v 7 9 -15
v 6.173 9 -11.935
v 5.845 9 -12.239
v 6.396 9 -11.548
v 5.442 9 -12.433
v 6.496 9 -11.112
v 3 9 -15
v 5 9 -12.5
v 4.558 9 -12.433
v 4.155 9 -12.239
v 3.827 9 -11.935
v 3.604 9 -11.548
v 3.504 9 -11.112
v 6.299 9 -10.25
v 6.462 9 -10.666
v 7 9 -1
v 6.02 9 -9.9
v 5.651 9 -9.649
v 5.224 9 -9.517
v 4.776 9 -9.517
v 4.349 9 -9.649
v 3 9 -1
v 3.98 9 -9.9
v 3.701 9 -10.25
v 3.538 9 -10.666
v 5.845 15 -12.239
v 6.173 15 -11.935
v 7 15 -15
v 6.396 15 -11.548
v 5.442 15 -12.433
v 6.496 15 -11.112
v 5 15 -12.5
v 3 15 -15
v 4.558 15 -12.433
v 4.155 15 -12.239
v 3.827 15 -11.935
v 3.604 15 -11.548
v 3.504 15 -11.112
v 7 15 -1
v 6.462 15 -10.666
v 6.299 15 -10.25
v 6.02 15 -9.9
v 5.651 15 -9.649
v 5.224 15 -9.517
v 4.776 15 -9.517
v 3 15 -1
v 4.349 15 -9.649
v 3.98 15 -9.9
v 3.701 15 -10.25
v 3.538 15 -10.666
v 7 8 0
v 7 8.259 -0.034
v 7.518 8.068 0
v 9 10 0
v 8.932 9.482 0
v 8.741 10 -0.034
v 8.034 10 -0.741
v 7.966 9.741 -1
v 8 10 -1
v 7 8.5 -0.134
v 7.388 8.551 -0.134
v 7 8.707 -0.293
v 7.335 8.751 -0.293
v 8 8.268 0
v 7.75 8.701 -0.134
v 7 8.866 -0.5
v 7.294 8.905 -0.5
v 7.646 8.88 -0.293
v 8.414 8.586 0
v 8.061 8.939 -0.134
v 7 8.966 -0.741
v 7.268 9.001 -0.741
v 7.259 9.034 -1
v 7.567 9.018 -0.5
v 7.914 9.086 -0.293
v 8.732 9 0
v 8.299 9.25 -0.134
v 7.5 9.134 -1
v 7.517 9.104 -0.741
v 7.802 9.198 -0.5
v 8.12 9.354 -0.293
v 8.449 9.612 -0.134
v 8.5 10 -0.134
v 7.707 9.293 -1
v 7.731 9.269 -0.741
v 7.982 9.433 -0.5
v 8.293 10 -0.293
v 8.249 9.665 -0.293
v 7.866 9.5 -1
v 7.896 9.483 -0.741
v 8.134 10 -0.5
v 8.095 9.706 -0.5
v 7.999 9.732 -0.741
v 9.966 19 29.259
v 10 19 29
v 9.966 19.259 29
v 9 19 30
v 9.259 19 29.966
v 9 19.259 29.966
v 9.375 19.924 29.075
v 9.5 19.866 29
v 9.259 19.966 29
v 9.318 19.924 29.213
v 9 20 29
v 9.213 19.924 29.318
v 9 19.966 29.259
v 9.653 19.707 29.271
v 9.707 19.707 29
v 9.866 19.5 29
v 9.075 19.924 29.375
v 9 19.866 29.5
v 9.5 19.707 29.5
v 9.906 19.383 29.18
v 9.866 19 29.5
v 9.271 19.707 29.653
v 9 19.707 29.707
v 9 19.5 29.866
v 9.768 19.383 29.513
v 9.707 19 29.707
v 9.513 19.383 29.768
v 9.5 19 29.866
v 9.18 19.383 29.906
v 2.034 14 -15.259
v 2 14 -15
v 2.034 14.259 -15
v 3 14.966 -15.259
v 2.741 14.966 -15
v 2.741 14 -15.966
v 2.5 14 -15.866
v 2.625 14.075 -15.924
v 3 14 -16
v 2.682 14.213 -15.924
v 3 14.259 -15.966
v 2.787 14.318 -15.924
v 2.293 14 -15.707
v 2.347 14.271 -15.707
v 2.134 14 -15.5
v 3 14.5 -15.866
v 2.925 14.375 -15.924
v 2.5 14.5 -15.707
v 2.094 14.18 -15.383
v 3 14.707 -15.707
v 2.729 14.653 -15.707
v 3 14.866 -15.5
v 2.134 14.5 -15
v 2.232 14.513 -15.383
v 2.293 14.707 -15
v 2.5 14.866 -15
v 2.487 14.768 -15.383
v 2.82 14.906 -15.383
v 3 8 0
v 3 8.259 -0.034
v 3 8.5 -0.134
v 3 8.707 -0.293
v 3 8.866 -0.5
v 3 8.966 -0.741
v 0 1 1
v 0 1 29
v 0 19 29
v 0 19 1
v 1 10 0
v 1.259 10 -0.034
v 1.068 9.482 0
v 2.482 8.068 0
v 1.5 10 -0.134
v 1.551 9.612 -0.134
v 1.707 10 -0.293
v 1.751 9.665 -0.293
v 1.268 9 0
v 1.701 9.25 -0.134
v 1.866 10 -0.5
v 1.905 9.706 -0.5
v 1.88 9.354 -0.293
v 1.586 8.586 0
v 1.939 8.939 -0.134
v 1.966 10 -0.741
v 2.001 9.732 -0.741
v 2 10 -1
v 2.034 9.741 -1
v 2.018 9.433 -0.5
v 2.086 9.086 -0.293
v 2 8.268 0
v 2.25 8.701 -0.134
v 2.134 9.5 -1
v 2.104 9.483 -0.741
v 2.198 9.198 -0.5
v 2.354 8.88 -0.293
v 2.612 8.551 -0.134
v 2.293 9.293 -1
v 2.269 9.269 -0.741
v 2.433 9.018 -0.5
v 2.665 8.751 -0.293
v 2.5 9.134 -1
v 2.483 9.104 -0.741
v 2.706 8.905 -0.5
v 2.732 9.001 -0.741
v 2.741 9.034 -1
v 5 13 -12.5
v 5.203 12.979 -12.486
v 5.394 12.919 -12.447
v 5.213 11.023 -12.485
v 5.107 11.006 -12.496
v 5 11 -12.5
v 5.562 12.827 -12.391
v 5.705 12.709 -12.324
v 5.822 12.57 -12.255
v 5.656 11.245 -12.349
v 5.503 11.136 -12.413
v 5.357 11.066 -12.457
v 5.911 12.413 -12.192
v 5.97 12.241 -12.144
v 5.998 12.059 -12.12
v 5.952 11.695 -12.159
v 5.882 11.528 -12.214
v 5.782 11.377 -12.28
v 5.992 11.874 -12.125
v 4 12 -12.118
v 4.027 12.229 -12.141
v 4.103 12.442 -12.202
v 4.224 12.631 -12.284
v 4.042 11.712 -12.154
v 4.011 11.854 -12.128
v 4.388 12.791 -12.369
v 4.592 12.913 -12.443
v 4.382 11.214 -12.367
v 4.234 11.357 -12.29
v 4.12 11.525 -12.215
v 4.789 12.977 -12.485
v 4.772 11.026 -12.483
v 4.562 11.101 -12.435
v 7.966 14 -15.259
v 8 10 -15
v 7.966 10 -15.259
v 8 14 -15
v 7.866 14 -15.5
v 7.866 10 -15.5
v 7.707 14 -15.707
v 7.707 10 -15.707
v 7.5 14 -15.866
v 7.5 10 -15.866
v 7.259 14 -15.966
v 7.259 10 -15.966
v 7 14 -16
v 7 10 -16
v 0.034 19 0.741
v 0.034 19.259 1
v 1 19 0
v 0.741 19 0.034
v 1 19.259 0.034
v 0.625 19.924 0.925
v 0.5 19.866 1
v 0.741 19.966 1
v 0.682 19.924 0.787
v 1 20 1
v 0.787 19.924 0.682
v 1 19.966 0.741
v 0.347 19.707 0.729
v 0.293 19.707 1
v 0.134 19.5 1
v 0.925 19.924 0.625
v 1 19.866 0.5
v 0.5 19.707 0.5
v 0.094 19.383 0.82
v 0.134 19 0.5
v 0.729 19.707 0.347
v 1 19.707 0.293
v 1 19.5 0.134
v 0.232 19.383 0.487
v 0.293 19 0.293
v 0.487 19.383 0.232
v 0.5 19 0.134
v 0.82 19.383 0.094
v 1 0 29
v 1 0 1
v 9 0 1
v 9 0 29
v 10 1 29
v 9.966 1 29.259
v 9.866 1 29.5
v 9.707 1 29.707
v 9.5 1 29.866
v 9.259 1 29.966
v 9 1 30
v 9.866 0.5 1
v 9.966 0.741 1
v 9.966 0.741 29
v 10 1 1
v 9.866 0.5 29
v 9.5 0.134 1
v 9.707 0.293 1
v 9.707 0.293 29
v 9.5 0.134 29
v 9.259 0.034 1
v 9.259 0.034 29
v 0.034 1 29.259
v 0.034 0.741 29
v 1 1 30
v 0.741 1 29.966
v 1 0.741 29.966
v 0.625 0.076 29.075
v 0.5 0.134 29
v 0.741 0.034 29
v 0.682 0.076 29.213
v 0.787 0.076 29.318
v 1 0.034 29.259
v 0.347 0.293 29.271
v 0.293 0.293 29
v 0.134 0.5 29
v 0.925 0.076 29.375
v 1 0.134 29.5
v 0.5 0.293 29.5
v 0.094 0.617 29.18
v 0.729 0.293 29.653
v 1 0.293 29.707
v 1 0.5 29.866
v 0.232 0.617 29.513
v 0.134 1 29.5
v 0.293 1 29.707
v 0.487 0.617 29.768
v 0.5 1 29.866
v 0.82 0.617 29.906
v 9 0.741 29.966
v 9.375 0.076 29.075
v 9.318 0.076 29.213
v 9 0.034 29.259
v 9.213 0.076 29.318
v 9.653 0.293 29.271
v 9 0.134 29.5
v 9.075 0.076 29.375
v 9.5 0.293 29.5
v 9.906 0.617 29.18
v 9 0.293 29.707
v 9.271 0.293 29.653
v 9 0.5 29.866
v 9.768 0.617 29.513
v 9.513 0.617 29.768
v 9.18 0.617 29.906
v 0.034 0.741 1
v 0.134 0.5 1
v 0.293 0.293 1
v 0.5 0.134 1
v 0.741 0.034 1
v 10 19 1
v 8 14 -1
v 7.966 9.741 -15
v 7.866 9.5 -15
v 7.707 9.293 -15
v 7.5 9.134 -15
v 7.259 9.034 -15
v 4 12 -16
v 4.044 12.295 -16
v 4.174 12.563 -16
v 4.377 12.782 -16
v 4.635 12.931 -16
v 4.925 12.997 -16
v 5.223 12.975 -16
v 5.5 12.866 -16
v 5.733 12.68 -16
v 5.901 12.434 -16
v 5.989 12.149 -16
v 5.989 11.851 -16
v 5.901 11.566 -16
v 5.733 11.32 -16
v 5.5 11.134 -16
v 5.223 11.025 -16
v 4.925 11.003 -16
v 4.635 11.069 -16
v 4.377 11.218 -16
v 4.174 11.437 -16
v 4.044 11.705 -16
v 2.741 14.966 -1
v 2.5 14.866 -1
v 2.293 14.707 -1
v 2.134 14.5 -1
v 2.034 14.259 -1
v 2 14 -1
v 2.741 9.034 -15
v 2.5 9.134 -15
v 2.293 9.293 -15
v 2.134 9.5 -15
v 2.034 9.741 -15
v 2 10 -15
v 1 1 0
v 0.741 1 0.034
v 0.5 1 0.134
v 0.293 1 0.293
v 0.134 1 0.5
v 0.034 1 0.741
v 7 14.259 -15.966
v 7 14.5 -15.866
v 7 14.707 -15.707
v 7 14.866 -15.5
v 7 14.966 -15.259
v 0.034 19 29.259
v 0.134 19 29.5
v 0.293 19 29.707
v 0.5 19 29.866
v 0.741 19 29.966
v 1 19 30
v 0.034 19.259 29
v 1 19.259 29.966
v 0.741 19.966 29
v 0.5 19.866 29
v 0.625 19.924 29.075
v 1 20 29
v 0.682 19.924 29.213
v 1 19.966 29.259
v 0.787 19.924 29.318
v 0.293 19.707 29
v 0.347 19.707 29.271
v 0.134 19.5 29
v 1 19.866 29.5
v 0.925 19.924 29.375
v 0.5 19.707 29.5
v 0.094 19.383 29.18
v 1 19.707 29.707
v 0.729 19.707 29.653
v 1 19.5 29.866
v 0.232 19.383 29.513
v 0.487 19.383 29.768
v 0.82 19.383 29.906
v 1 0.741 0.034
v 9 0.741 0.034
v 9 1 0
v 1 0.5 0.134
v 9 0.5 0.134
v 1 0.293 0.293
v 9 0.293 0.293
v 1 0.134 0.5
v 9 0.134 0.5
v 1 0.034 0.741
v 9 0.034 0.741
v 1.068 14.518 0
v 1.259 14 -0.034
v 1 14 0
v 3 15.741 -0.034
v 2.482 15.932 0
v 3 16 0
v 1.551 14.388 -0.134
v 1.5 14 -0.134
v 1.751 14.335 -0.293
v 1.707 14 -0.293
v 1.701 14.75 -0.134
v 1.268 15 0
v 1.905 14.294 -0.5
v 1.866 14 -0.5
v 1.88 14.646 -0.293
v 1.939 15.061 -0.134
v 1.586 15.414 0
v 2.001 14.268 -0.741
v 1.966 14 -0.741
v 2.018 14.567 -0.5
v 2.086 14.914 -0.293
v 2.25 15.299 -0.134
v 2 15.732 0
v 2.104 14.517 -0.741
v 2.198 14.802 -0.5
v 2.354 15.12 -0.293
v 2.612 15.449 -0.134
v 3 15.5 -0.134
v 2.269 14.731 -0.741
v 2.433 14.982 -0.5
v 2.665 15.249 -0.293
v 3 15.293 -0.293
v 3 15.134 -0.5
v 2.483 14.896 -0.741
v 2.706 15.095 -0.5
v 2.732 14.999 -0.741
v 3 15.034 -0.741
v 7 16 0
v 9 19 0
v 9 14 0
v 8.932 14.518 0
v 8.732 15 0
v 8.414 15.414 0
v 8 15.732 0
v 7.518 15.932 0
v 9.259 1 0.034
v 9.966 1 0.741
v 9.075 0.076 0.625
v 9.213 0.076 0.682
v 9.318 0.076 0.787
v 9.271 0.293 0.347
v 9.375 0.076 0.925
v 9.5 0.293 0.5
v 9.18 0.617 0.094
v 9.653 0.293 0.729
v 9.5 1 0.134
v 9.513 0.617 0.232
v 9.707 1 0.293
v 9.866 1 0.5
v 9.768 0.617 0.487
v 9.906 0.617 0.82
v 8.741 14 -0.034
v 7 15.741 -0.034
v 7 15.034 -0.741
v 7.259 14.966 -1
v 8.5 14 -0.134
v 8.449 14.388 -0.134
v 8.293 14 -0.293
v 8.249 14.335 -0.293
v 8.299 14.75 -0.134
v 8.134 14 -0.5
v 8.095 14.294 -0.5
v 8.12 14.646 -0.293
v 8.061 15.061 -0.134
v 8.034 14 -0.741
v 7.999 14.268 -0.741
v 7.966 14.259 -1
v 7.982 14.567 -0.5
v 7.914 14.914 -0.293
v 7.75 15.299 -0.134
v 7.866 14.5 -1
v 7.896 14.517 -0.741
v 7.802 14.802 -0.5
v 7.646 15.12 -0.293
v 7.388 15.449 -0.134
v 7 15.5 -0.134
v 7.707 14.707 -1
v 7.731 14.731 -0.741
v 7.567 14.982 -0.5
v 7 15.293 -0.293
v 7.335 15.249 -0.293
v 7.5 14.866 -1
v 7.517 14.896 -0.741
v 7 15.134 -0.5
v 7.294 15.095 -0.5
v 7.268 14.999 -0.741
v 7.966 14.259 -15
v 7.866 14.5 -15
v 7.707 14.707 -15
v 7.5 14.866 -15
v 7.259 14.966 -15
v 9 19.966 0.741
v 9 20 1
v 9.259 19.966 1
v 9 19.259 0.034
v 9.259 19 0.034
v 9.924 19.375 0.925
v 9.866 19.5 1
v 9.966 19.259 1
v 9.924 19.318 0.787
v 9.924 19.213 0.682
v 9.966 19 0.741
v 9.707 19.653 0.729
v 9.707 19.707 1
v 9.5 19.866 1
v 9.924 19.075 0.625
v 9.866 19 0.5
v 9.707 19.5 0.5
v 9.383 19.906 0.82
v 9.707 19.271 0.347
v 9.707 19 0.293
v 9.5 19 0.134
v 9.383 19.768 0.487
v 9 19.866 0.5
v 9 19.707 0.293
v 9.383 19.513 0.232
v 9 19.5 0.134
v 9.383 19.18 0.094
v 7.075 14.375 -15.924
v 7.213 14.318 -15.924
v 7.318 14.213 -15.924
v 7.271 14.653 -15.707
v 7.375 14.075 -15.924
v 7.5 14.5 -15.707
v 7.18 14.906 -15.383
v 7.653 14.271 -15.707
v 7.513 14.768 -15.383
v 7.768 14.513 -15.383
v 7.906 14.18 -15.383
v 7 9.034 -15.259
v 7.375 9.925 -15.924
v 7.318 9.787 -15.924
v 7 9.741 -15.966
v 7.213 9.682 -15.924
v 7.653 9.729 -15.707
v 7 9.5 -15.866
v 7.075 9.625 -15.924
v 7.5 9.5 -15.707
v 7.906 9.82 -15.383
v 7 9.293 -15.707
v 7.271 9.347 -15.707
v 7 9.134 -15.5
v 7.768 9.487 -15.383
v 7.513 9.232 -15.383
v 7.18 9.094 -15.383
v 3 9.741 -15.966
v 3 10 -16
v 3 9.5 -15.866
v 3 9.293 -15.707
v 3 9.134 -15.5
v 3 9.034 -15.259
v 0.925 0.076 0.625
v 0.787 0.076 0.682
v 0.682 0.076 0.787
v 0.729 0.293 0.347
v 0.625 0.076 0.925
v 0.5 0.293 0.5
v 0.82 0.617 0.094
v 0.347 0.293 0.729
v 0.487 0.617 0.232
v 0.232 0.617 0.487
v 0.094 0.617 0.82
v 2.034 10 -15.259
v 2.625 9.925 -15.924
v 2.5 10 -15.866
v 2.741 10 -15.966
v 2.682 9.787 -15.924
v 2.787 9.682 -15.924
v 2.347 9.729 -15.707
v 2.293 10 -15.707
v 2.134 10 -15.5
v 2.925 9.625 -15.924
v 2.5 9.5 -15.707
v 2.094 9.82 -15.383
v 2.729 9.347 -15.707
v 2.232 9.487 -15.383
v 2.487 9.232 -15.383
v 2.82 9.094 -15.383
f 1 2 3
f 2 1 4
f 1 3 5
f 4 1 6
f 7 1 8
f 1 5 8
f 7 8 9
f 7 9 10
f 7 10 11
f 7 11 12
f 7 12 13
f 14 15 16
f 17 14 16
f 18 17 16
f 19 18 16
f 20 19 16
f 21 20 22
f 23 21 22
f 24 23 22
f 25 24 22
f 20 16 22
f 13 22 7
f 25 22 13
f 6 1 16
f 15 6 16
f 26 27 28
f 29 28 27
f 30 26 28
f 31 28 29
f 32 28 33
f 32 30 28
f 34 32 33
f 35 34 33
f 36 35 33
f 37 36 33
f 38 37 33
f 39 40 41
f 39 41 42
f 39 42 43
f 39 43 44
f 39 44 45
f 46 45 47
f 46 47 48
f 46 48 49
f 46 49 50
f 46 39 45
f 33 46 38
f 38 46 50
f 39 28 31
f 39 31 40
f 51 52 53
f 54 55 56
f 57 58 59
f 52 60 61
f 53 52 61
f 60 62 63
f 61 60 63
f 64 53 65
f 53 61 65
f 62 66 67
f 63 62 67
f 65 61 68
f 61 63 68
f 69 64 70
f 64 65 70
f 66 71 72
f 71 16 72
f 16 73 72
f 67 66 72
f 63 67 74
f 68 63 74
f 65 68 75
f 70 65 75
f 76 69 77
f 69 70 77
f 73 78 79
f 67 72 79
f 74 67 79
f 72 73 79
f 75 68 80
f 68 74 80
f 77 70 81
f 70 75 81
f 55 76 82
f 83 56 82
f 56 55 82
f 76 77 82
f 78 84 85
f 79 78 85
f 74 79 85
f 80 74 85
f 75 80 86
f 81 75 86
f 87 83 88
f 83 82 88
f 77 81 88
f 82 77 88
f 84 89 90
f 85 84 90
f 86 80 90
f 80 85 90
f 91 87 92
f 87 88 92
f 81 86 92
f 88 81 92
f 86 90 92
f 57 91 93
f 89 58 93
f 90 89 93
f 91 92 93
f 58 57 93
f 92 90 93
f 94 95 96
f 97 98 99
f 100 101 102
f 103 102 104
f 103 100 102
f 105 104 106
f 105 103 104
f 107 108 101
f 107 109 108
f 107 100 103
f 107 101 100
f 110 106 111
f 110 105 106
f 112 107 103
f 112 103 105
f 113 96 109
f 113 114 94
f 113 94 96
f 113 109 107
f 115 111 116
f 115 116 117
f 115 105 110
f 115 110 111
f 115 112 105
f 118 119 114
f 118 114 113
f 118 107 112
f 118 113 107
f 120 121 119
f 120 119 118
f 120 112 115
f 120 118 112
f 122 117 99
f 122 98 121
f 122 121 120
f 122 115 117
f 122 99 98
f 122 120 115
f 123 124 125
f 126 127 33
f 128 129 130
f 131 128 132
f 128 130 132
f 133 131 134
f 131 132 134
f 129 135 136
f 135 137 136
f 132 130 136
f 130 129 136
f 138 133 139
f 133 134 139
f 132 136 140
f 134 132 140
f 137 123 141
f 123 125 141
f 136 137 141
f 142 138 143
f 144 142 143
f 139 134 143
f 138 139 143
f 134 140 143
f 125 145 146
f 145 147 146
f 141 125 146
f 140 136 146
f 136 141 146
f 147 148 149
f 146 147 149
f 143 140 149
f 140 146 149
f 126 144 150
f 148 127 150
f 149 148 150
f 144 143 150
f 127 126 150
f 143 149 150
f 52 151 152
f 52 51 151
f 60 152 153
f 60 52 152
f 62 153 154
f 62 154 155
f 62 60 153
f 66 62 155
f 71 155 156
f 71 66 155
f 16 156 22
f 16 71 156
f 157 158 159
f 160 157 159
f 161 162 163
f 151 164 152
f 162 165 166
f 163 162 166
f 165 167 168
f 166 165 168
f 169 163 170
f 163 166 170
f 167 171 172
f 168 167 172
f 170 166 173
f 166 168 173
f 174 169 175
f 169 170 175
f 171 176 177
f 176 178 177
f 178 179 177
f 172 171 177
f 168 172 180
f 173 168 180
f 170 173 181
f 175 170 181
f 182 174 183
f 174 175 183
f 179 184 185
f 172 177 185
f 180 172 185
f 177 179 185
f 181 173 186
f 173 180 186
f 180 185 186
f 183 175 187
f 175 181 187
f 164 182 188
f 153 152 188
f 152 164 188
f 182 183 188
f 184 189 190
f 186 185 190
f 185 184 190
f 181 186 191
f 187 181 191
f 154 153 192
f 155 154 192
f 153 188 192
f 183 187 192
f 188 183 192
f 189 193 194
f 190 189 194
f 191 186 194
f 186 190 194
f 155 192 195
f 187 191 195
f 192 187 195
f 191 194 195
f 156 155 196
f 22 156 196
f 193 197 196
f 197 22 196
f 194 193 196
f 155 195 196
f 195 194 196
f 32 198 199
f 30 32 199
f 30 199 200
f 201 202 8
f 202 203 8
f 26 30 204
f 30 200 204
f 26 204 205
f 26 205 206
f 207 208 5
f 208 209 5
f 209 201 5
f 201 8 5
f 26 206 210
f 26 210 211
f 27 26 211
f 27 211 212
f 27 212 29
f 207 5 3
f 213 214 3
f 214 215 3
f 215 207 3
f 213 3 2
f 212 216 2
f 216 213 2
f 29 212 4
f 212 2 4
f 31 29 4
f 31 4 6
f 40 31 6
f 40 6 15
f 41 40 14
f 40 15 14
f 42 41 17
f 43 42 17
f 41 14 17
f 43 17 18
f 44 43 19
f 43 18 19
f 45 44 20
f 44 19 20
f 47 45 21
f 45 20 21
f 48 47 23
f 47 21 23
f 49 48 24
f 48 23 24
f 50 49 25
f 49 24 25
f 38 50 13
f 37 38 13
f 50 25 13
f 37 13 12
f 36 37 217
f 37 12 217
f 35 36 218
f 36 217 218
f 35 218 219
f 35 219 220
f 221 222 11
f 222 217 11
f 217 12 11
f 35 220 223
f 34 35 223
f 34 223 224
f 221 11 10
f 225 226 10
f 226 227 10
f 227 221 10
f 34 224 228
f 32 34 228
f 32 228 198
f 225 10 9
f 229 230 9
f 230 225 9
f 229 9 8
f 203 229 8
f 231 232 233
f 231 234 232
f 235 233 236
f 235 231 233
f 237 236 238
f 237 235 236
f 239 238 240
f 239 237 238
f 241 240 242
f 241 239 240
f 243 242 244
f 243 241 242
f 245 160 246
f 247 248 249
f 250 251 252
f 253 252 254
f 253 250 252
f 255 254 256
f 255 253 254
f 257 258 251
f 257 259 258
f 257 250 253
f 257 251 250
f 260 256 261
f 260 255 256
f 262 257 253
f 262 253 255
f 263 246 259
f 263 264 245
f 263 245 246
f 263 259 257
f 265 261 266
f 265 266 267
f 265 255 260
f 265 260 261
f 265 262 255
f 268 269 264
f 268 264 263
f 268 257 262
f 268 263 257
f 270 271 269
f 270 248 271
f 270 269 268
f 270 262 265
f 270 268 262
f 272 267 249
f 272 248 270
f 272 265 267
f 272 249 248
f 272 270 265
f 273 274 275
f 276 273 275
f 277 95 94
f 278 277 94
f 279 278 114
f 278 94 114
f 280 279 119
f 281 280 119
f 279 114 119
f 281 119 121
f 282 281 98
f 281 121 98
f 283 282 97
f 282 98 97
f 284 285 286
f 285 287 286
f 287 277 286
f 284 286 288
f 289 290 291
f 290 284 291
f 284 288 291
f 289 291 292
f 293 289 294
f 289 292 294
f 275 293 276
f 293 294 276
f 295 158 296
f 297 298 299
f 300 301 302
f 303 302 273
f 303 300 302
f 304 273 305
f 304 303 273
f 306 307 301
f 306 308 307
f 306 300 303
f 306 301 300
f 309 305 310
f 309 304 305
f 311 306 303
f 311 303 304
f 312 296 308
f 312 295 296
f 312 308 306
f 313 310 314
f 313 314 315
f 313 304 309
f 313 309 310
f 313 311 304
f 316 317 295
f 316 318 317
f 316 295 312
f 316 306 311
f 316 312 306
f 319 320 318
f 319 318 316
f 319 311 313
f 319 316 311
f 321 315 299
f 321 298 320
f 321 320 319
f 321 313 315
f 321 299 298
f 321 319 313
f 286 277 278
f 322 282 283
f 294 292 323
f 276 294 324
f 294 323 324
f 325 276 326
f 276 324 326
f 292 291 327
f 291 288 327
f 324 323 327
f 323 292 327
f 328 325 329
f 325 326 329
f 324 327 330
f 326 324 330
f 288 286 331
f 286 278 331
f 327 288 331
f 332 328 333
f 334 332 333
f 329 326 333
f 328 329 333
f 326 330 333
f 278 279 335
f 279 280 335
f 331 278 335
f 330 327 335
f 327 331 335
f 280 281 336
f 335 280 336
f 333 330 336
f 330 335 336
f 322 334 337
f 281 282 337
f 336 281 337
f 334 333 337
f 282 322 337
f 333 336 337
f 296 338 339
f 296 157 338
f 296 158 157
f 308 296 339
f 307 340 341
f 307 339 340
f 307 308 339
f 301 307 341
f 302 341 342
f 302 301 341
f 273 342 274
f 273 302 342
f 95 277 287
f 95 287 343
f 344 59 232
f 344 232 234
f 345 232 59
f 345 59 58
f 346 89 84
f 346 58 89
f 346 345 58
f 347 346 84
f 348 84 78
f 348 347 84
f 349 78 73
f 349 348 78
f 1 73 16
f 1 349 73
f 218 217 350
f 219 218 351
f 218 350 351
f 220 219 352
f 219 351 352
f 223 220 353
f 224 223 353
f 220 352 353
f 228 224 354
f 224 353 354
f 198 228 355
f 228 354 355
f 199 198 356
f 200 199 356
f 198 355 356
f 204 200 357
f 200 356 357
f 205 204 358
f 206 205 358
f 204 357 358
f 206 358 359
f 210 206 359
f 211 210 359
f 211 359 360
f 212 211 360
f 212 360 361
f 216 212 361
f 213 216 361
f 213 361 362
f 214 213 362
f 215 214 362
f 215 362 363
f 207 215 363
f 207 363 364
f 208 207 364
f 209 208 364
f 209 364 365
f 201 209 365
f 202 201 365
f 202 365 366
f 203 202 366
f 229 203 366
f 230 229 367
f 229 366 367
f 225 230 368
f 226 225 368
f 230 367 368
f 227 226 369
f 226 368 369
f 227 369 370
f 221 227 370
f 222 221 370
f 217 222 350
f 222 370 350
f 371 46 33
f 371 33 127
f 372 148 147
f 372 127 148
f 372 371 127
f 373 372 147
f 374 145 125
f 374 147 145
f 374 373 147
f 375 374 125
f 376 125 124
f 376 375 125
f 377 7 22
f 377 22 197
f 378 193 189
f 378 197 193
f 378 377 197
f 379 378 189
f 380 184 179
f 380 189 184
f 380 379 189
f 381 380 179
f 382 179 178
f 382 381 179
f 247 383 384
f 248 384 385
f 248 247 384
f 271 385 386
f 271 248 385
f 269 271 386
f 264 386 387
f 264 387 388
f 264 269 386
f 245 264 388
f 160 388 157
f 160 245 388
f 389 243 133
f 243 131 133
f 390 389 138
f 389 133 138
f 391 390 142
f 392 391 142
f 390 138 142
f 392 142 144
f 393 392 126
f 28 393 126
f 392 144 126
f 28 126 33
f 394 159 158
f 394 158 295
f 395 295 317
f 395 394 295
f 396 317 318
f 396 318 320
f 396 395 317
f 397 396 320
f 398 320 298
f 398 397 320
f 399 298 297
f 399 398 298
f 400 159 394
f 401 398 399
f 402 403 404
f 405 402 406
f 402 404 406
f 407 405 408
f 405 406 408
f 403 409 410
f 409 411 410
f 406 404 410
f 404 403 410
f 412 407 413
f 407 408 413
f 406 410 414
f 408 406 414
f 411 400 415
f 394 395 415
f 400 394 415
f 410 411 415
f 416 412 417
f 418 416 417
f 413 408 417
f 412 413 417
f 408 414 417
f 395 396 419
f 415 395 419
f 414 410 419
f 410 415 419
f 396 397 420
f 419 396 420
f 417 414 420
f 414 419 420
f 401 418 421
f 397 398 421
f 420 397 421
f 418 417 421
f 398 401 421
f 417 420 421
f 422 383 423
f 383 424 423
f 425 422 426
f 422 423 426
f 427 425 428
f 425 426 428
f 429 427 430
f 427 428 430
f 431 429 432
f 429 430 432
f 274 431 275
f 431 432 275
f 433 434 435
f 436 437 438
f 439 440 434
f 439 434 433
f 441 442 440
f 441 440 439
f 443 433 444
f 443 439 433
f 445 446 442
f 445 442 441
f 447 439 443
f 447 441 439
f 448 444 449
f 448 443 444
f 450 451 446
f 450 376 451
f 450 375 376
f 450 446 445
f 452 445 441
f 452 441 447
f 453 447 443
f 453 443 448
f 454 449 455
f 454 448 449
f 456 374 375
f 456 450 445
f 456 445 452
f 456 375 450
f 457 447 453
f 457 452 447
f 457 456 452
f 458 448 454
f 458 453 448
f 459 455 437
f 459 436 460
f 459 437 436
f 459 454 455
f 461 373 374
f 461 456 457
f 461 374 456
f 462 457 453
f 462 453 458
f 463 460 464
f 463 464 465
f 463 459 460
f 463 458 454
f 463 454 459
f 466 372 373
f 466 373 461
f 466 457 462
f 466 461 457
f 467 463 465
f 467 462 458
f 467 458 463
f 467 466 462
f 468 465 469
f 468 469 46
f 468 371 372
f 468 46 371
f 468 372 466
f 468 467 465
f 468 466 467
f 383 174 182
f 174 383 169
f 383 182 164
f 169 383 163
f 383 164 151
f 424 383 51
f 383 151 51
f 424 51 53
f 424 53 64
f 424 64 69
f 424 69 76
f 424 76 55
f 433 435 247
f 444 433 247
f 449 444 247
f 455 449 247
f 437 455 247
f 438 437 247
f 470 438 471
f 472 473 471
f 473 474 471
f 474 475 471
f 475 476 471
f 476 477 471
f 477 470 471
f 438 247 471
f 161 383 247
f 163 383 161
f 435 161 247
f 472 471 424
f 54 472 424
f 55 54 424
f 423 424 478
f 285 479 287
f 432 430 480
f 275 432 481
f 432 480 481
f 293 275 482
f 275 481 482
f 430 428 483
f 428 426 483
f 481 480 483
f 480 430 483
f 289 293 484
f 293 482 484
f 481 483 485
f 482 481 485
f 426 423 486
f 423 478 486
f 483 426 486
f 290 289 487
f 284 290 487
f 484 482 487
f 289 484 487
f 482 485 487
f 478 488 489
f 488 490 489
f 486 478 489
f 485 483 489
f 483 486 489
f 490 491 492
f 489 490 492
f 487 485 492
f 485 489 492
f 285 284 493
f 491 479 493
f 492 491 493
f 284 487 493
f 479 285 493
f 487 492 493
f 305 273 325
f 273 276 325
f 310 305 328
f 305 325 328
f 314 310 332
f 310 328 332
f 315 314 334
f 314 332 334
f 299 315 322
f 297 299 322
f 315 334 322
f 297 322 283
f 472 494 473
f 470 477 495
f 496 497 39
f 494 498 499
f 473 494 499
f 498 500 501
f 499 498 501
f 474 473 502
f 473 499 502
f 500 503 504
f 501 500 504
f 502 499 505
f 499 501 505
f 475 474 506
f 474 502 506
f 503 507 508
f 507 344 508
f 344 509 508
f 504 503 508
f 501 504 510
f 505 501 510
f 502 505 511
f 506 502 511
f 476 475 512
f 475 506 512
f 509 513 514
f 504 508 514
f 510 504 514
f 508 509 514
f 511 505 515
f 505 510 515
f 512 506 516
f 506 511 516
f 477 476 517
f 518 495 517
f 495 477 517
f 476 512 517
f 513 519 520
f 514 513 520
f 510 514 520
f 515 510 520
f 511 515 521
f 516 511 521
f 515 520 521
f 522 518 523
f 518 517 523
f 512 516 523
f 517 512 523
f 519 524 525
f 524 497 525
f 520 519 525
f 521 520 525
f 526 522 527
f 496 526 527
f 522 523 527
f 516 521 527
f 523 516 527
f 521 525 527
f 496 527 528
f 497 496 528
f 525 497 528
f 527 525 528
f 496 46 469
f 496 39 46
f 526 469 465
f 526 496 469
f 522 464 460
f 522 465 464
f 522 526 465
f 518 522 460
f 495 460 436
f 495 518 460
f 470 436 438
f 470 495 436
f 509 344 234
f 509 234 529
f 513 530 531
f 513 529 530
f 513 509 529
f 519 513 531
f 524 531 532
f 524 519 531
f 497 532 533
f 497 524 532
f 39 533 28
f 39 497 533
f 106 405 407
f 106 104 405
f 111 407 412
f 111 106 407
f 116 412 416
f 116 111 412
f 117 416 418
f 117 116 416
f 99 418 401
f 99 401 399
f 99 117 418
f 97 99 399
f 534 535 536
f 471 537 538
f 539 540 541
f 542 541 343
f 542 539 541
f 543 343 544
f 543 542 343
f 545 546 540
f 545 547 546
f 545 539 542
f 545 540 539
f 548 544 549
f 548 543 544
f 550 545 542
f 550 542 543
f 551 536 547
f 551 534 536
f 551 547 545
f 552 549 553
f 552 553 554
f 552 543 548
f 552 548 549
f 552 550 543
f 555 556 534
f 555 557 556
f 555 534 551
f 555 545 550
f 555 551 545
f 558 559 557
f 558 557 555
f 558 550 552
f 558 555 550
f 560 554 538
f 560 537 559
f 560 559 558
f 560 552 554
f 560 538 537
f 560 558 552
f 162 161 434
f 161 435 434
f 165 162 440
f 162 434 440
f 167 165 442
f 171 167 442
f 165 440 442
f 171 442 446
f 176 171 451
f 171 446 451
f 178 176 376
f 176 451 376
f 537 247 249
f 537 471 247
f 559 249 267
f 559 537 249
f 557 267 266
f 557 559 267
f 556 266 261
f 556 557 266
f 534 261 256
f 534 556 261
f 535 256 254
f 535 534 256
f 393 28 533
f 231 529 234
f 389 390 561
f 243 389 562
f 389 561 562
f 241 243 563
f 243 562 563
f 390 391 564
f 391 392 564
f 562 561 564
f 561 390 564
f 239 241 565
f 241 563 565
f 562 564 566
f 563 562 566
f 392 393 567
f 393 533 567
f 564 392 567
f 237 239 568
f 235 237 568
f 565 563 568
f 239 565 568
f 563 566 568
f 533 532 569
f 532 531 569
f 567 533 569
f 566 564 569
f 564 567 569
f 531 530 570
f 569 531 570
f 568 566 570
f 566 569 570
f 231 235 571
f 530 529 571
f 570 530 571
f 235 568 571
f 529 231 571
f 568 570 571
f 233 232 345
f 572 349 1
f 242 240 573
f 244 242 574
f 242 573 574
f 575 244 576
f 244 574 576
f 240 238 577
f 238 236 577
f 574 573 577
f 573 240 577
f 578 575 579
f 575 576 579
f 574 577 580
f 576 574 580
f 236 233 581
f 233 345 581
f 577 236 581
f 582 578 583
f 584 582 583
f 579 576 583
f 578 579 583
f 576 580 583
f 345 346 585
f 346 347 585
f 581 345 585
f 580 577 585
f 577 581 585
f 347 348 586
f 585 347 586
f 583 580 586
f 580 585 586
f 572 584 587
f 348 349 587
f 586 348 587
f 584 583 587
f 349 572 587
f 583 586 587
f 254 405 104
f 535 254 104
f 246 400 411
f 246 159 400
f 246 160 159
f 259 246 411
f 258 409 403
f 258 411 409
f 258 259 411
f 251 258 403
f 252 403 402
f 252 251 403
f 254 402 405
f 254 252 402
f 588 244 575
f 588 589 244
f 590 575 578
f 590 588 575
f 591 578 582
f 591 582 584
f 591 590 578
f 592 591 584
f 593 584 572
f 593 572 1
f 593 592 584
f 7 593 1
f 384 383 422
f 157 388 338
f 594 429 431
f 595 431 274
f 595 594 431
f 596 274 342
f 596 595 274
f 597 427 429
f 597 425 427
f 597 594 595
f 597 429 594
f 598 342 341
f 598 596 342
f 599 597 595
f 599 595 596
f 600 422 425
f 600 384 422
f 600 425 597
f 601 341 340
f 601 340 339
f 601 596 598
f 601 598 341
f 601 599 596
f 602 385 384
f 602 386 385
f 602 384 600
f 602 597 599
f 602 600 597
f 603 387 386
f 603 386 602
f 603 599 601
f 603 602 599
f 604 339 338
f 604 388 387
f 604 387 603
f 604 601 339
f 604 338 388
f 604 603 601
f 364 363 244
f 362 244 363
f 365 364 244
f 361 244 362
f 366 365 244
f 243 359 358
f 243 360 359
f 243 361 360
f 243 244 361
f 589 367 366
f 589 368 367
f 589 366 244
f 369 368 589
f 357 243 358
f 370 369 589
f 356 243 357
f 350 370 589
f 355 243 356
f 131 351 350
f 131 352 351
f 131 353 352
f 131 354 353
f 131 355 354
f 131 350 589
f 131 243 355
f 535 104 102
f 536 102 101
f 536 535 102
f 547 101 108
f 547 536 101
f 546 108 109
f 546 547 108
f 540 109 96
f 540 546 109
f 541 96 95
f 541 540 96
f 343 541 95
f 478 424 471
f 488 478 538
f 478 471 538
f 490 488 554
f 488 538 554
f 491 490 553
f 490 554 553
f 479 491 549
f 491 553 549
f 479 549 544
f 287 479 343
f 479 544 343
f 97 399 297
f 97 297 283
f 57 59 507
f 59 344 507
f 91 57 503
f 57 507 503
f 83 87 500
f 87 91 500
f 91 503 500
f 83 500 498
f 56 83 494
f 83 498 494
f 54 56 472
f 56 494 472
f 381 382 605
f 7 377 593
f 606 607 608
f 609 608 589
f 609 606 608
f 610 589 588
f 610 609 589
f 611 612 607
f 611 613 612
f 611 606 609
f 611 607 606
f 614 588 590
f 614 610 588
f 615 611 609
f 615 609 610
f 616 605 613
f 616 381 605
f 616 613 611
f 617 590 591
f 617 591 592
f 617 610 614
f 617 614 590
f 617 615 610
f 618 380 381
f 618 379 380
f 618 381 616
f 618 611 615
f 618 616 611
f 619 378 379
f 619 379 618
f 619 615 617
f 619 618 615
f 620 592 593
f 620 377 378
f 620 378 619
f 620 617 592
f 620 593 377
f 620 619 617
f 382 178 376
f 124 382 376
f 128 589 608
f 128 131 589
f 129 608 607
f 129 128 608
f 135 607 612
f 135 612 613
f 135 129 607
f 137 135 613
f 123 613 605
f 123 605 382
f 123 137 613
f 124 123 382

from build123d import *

# Parameters (mm, degrees)
SKETCH_1_W          = 10
SKETCH_1_H          = 22
EXTRUDE_1_DEPTH     = 30
SKETCH_2_W          = 6
SKETCH_2_H          = 6
EXTRUDE_3_DEPTH     = 14
SKETCH_3_R          = 1.5
CUT_EXTRUDE_1_DEPTH = 6
SKETCH_6_W          = 10
SKETCH_6_H          = 30
CUT_EXTRUDE_2_DEPTH = 2
SKETCH_7_W          = 6
SKETCH_7_H          = 6
EXTRUDE_4_DEPTH     = 2
SKETCH_8_R          = 1
CUT_EXTRUDE_3_DEPTH = 4
FILLET_1_R          = 1


with BuildPart() as part:
    # 草图1 → 凸台-拉伸1 (new body)
    with BuildSketch(Plane.XY):
        with Locations((5, 11)):
            Rectangle(SKETCH_1_W, SKETCH_1_H)
    extrude(amount=EXTRUDE_1_DEPTH)

    # 草图2 → 凸台-拉伸3 (add)
    with BuildSketch(Plane.XY):
        with Locations((5, 12)):
            Rectangle(SKETCH_2_W, SKETCH_2_H)
    extrude(amount=-EXTRUDE_3_DEPTH)

    # 草图3 → 切除-拉伸1 (cut)
    with BuildSketch(Plane(origin=(0, 9, 0), x_dir=(-1, 0, 0), z_dir=(0, -1, 0))):
        with Locations(Location((-5, 11, 0), (0, 0, 90))):
            Circle(SKETCH_3_R)
    extrude(amount=-CUT_EXTRUDE_1_DEPTH, mode=Mode.SUBTRACT)

    # 草图6 → 切除-拉伸2 (cut)
    with BuildSketch(Plane(origin=(0, 22, 0), x_dir=(1, 0, 0), z_dir=(0, 1, 0))):
        with Locations((5, -15)):
            Rectangle(SKETCH_6_W, SKETCH_6_H)
    extrude(amount=-CUT_EXTRUDE_2_DEPTH, mode=Mode.SUBTRACT)

    # 草图7 → 凸台-拉伸4 (add)
    with BuildSketch(Plane(origin=(0, 0, -14), x_dir=(-1, 0, 0), z_dir=(0, 0, -1))):
        with Locations((-5, 12)):
            Rectangle(SKETCH_7_W, SKETCH_7_H)
    extrude(amount=EXTRUDE_4_DEPTH)

    # 草图8 → 切除-拉伸3 (cut)
    with BuildSketch(Plane(origin=(0, 0, -16), x_dir=(-1, 0, 0), z_dir=(0, 0, -1))):
        with Locations((-5, 12)):
            Circle(SKETCH_8_R)
    extrude(amount=-CUT_EXTRUDE_3_DEPTH, mode=Mode.SUBTRACT)

    # 圆角1
    fillet_1_edges = [part.edges().sort_by_distance(p)[0] for p in [
        (10, 10, 30),
        (2, 9, -8),
        (2, 15, -8),
        (8, 15, -8),
        (8, 9, -8),
        (2, 12, 0),
        (5, 9, 0),
        (8, 12, 0),
        (5, 15, 0),
        (0, 10, 30),
        (0, 10, 0),
        (0, 20, 15),
        (5, 20, 0),
        (10, 20, 15),
        (5, 20, 30),
        (2, 12, -16),
        (5, 15, -16),
        (8, 12, -16),
        (5, 9, -16),
        (10, 10, 0),
        (5, 0, 0),
        (10, 0, 15),
        (0, 0, 15),
        (5, 0, 30),
    ]]
    fillet(fillet_1_edges, radius=FILLET_1_R - 0.0001)  # a hair under: the kernel refuses the full size


solid = part.part
